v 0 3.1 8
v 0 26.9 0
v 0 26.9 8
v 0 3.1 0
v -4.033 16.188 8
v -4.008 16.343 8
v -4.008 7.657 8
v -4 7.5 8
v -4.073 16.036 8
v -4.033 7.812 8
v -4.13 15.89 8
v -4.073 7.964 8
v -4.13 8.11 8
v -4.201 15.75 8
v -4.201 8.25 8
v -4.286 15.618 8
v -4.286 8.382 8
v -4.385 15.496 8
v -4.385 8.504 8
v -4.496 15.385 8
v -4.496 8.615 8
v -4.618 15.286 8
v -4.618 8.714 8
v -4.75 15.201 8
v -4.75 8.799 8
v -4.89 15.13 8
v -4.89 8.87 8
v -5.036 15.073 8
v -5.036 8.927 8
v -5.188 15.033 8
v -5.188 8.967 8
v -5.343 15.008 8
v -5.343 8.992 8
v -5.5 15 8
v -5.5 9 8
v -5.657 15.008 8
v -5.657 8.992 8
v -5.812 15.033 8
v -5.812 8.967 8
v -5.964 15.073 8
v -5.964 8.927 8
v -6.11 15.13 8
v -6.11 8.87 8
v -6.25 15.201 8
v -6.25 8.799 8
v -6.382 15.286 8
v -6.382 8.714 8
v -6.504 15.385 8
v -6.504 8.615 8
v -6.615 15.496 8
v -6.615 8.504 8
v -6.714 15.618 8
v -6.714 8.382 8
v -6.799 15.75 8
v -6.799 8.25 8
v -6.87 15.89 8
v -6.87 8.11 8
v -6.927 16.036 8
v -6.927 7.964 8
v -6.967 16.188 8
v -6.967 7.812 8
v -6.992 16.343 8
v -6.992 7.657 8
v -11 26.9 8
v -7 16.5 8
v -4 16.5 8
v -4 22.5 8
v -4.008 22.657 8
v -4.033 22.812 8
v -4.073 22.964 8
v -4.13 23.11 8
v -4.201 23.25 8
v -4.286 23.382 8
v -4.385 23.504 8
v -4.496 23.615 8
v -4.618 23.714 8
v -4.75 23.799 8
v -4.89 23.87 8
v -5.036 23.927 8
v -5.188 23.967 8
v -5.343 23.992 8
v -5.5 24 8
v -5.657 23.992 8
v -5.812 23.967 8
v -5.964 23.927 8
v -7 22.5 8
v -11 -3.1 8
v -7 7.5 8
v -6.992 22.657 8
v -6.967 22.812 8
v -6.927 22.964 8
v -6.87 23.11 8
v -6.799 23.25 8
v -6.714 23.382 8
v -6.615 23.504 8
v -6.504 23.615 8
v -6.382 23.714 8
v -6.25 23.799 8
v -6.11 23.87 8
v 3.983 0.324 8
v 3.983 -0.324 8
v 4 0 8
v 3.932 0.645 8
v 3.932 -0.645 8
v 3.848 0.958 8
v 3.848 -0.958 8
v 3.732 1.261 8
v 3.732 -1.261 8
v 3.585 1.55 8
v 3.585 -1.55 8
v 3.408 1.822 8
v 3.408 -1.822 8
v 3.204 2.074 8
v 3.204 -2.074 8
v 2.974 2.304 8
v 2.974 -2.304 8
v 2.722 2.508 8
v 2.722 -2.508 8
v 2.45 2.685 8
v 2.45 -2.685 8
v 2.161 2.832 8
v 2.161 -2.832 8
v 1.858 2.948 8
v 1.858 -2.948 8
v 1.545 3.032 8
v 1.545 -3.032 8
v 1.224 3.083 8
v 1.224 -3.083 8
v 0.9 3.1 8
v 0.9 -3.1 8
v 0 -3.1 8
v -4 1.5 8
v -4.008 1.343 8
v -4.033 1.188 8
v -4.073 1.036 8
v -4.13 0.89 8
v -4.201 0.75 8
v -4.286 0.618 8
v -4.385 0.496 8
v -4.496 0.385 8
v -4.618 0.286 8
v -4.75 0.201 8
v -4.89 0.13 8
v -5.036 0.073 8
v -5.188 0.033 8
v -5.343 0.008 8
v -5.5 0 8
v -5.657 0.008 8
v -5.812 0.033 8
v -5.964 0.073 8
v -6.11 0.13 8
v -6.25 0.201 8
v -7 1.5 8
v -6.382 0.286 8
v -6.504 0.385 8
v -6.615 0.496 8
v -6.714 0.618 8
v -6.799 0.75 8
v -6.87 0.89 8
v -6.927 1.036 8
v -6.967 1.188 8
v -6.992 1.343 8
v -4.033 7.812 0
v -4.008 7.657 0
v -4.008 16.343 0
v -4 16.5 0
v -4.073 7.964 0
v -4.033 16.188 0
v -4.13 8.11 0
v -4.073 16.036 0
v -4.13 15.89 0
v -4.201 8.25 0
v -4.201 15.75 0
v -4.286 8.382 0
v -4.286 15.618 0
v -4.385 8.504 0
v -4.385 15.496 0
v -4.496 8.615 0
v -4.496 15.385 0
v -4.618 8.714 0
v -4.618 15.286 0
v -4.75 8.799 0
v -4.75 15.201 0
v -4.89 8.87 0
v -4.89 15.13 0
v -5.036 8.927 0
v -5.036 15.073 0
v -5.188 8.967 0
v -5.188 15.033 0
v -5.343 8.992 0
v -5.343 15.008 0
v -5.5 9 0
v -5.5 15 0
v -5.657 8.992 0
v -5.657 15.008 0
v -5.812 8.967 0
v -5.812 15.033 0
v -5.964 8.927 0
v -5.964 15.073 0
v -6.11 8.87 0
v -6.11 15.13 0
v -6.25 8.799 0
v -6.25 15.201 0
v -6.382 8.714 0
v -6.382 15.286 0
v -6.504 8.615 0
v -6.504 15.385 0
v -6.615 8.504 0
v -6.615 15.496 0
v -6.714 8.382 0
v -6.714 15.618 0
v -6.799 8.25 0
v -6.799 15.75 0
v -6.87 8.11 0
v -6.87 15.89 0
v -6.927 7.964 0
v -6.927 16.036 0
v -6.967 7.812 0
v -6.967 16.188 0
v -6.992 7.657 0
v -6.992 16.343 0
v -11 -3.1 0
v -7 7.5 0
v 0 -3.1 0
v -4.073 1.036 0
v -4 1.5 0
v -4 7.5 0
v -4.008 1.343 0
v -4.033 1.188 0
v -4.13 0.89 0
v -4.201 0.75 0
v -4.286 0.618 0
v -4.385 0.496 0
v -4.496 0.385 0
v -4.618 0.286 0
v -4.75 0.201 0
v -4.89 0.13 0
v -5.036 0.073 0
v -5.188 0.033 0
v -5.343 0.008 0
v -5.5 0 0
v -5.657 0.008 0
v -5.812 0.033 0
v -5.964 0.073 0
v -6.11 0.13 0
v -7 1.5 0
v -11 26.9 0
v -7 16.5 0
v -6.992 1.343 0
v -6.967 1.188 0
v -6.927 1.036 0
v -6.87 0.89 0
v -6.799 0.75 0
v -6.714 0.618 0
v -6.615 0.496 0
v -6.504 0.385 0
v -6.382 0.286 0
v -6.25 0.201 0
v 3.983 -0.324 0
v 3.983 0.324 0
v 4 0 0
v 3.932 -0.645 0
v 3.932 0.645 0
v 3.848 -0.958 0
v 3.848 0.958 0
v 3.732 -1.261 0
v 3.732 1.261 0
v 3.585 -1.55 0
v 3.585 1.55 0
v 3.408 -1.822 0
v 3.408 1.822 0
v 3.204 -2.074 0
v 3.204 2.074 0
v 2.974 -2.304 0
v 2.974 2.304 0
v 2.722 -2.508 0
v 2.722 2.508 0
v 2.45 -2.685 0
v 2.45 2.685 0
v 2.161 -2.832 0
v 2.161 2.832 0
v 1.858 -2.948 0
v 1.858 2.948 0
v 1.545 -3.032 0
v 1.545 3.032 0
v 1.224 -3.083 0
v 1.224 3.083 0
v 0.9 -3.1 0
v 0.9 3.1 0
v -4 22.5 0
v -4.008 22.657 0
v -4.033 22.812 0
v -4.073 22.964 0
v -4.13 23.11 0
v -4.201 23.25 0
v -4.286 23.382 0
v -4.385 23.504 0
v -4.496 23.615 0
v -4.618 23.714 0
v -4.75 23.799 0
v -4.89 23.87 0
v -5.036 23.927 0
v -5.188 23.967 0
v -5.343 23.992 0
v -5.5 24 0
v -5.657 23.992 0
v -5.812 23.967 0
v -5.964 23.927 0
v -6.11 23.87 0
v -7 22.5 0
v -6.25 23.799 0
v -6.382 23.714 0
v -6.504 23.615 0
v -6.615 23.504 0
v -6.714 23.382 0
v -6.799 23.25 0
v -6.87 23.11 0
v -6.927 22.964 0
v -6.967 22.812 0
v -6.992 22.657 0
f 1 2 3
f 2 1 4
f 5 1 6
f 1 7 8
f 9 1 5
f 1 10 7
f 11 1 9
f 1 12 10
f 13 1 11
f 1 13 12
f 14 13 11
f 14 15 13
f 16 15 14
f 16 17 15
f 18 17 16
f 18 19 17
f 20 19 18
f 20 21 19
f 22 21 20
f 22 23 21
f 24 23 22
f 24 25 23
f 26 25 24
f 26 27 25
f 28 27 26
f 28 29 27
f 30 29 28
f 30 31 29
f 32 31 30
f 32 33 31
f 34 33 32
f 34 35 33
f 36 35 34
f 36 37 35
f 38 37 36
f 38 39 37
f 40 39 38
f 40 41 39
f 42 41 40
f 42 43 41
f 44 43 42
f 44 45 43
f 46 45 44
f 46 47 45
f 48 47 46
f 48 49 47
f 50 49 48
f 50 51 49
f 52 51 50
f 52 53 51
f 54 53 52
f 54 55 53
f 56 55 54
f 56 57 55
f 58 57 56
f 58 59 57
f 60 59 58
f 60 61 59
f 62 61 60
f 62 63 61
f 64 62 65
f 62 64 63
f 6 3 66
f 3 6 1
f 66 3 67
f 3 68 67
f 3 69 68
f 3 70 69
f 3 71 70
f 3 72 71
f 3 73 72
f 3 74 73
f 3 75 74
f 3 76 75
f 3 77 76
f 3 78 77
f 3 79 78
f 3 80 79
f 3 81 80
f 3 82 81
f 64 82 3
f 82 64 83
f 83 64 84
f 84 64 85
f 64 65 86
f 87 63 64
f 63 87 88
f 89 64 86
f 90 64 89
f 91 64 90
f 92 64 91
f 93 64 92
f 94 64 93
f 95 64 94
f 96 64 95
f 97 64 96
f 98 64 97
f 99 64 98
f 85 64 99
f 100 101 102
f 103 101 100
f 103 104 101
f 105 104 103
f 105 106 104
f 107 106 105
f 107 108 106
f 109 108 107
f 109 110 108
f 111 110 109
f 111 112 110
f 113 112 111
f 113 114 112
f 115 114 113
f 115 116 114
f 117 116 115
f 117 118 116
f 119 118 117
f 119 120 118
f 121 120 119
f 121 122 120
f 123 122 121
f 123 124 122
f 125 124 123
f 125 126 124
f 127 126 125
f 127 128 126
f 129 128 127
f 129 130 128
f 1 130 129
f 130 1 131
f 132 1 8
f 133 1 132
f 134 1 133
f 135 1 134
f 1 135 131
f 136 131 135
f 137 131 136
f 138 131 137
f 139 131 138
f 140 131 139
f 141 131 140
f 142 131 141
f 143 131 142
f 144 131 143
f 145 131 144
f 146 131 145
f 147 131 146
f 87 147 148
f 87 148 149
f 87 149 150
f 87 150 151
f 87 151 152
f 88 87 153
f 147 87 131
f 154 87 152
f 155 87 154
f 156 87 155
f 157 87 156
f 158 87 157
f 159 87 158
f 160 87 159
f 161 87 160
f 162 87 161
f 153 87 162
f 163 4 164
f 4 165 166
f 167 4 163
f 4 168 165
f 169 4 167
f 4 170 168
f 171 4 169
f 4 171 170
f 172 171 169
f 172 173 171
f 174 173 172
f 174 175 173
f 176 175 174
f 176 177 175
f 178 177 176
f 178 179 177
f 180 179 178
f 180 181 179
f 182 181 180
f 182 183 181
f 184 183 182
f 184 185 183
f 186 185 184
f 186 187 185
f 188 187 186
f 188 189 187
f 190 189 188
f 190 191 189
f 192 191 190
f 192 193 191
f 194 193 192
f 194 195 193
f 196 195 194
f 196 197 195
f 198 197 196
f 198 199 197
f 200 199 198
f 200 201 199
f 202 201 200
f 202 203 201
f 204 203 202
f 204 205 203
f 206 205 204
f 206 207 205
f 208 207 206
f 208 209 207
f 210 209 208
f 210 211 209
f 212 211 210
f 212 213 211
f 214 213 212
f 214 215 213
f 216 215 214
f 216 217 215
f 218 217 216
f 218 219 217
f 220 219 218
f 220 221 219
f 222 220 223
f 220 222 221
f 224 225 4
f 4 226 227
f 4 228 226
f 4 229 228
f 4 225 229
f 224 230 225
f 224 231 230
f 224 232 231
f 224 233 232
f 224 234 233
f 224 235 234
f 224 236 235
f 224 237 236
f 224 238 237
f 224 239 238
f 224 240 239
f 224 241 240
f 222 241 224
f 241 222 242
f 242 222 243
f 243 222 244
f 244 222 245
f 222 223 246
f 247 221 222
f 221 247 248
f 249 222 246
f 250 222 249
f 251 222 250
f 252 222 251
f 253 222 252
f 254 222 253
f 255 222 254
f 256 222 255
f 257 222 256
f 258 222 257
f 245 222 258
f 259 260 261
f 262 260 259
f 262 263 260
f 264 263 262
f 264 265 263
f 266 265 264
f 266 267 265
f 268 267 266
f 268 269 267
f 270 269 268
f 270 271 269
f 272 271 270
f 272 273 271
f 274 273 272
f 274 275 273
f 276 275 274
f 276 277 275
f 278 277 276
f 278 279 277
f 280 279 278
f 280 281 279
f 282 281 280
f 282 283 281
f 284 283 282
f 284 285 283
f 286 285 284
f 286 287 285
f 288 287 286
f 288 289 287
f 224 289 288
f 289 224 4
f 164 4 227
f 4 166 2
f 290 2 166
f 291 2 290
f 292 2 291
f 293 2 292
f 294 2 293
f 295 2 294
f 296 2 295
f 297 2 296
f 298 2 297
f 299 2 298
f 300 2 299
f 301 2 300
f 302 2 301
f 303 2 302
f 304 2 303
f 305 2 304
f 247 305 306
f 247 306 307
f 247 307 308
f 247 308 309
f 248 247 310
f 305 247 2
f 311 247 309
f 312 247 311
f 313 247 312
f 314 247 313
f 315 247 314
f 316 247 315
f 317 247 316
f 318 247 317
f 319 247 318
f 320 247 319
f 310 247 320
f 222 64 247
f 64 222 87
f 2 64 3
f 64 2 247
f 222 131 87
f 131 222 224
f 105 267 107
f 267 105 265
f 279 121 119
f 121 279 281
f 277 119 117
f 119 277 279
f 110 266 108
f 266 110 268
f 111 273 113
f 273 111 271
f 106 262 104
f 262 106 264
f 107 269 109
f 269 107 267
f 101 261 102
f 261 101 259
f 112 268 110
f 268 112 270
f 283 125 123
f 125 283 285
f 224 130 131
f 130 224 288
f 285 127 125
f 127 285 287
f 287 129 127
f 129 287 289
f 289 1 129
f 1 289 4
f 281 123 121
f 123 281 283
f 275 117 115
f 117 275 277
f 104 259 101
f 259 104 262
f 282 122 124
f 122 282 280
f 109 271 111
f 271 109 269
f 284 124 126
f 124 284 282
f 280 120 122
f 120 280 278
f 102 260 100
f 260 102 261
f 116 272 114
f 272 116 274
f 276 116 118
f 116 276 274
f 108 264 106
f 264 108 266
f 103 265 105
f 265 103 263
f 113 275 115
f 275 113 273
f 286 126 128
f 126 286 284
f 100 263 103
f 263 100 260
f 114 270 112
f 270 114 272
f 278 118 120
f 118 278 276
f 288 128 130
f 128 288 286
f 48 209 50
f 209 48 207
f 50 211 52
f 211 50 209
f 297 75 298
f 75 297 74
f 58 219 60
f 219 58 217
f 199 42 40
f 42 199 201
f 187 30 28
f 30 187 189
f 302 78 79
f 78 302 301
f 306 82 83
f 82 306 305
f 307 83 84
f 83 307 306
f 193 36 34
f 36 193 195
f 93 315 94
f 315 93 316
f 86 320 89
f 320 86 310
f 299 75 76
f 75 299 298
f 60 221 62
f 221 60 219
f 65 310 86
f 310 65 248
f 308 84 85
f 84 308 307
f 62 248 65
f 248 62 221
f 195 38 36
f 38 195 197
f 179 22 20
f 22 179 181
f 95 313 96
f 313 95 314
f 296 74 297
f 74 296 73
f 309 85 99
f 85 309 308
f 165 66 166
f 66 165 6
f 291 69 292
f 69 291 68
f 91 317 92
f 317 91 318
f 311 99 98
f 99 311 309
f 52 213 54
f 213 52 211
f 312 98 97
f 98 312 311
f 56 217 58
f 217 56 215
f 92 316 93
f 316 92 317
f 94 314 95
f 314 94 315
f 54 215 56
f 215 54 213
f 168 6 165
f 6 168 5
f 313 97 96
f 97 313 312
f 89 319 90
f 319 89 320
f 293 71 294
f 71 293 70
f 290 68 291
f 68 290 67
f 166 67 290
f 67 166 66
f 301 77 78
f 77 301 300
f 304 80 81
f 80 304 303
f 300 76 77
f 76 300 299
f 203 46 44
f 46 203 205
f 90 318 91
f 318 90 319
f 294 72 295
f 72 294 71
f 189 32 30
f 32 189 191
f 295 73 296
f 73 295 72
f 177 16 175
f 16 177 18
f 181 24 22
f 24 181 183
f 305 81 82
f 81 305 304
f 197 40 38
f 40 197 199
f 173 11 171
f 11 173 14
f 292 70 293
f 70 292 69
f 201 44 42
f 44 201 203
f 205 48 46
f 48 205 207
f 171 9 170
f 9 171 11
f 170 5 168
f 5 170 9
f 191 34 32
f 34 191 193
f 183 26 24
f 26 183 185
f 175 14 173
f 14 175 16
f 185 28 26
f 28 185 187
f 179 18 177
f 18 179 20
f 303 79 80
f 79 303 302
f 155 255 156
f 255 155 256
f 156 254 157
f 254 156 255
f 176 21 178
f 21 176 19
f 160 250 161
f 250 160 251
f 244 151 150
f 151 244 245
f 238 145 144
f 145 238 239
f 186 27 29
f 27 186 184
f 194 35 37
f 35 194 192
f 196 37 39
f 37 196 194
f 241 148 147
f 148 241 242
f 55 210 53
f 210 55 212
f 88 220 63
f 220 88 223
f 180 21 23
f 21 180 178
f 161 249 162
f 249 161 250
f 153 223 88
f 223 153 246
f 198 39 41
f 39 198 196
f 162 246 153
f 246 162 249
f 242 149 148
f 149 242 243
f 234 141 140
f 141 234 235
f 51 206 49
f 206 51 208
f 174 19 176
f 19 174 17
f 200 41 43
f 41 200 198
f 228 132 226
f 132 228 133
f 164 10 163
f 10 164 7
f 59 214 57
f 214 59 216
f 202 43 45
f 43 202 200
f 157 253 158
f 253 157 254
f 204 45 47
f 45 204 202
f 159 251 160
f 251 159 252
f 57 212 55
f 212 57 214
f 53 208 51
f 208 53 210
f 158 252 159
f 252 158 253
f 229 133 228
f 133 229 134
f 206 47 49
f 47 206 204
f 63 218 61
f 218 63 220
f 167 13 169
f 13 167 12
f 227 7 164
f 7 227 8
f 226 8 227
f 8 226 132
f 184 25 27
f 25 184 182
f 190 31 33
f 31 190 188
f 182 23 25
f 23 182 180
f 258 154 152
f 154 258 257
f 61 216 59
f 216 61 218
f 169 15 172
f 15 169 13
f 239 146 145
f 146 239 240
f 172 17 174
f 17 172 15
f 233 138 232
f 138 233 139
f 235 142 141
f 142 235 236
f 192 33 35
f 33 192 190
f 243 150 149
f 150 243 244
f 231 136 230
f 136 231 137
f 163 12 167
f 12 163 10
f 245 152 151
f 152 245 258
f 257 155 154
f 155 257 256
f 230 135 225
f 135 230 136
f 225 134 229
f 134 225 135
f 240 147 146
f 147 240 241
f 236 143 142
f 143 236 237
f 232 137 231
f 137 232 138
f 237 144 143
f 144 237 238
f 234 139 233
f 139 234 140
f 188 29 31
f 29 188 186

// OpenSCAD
// file: functions.scad
// -----------------------------------------------------
// Utility: squircle (circle + rectangle)
// -----------------------------------------------------

module squircle(radius, foot, segments) {
    union() {
        circle(r = radius, $fn = segments);
        translate([-(radius + foot) / 2, 0, 0])
            square([foot + radius, 2 * radius], center = true);
    }
}

//
// 2D rounded rectangle centered optionally on X/Y.
//
module rounded_rect(l, w, r, center=false, xcenter=false, ycenter=false) {
    translate([
        (center || xcenter) ? -l/2 : 0,
        (center || ycenter) ? -w/2 : 0
    ])
    translate([r, r])
        offset(r = r, $fn = 60)
            // Core rectangle; note that rounding eats 2*r in both directions
            square([l - 2*r, w - 2*r]);
}
// main file
// Adjustable Tip for Joint Box Machine
// Purpose: Sets the teeth stepping on a joint box machine.
// Author: [Your Name]
// License: [Specify, e.g., MIT, GPL, etc.]

include <functions.scad>

// --- User-configurable parameters ---
length = 30;           // Total length of the bump
width = 11;            // Width of the main body
thickness = 8;        // Thickness of the main body
tip_width = 6.2;      // Width of the tip (tooth stepping feature)
tip_length = 4;       // Length of the tip
rscrew = 1.5;          // Radius of the screw holes
lateral_clearance = 6; // Clearance for lateral movement
$fn = 60;              // Resolution for rounded shapes

// --- Modules ---

// Creates a screw hole with lateral clearance
module screw_hole() {
    linear_extrude(height = thickness)
        union() {
            translate(v = [-lateral_clearance, 0, 0])
                rotate(180)
                    squircle(radius = rscrew, foot = lateral_clearance/2, segments = $fn);
            squircle(radius = rscrew, foot = lateral_clearance/2, segments = $fn);
        }
}

// Main body, including the tip for teeth stepping
module body() {
    union() {
        // Main rectangular body
        translate(v = [-width, -tip_width/2, 0])
            cube(size = [width, length, thickness]);

        // tip for teeth stepping
        translate(v = [tip_length - tip_width/2, 0, 0])
            linear_extrude(height = thickness)
                squircle(tip_width/2, tip_length, $fn);
    }
}

// --- Main assembly ---
difference() {
    body();

    // Screw holes (rotated 90 degrees to match the body orientation)
    translate(v = [-width/2, 6*length/8, 0])
        rotate(90)
            screw_hole();

    translate(v = [-width/2, 2*length/8, 0])
        rotate(90)
            screw_hole();
}
